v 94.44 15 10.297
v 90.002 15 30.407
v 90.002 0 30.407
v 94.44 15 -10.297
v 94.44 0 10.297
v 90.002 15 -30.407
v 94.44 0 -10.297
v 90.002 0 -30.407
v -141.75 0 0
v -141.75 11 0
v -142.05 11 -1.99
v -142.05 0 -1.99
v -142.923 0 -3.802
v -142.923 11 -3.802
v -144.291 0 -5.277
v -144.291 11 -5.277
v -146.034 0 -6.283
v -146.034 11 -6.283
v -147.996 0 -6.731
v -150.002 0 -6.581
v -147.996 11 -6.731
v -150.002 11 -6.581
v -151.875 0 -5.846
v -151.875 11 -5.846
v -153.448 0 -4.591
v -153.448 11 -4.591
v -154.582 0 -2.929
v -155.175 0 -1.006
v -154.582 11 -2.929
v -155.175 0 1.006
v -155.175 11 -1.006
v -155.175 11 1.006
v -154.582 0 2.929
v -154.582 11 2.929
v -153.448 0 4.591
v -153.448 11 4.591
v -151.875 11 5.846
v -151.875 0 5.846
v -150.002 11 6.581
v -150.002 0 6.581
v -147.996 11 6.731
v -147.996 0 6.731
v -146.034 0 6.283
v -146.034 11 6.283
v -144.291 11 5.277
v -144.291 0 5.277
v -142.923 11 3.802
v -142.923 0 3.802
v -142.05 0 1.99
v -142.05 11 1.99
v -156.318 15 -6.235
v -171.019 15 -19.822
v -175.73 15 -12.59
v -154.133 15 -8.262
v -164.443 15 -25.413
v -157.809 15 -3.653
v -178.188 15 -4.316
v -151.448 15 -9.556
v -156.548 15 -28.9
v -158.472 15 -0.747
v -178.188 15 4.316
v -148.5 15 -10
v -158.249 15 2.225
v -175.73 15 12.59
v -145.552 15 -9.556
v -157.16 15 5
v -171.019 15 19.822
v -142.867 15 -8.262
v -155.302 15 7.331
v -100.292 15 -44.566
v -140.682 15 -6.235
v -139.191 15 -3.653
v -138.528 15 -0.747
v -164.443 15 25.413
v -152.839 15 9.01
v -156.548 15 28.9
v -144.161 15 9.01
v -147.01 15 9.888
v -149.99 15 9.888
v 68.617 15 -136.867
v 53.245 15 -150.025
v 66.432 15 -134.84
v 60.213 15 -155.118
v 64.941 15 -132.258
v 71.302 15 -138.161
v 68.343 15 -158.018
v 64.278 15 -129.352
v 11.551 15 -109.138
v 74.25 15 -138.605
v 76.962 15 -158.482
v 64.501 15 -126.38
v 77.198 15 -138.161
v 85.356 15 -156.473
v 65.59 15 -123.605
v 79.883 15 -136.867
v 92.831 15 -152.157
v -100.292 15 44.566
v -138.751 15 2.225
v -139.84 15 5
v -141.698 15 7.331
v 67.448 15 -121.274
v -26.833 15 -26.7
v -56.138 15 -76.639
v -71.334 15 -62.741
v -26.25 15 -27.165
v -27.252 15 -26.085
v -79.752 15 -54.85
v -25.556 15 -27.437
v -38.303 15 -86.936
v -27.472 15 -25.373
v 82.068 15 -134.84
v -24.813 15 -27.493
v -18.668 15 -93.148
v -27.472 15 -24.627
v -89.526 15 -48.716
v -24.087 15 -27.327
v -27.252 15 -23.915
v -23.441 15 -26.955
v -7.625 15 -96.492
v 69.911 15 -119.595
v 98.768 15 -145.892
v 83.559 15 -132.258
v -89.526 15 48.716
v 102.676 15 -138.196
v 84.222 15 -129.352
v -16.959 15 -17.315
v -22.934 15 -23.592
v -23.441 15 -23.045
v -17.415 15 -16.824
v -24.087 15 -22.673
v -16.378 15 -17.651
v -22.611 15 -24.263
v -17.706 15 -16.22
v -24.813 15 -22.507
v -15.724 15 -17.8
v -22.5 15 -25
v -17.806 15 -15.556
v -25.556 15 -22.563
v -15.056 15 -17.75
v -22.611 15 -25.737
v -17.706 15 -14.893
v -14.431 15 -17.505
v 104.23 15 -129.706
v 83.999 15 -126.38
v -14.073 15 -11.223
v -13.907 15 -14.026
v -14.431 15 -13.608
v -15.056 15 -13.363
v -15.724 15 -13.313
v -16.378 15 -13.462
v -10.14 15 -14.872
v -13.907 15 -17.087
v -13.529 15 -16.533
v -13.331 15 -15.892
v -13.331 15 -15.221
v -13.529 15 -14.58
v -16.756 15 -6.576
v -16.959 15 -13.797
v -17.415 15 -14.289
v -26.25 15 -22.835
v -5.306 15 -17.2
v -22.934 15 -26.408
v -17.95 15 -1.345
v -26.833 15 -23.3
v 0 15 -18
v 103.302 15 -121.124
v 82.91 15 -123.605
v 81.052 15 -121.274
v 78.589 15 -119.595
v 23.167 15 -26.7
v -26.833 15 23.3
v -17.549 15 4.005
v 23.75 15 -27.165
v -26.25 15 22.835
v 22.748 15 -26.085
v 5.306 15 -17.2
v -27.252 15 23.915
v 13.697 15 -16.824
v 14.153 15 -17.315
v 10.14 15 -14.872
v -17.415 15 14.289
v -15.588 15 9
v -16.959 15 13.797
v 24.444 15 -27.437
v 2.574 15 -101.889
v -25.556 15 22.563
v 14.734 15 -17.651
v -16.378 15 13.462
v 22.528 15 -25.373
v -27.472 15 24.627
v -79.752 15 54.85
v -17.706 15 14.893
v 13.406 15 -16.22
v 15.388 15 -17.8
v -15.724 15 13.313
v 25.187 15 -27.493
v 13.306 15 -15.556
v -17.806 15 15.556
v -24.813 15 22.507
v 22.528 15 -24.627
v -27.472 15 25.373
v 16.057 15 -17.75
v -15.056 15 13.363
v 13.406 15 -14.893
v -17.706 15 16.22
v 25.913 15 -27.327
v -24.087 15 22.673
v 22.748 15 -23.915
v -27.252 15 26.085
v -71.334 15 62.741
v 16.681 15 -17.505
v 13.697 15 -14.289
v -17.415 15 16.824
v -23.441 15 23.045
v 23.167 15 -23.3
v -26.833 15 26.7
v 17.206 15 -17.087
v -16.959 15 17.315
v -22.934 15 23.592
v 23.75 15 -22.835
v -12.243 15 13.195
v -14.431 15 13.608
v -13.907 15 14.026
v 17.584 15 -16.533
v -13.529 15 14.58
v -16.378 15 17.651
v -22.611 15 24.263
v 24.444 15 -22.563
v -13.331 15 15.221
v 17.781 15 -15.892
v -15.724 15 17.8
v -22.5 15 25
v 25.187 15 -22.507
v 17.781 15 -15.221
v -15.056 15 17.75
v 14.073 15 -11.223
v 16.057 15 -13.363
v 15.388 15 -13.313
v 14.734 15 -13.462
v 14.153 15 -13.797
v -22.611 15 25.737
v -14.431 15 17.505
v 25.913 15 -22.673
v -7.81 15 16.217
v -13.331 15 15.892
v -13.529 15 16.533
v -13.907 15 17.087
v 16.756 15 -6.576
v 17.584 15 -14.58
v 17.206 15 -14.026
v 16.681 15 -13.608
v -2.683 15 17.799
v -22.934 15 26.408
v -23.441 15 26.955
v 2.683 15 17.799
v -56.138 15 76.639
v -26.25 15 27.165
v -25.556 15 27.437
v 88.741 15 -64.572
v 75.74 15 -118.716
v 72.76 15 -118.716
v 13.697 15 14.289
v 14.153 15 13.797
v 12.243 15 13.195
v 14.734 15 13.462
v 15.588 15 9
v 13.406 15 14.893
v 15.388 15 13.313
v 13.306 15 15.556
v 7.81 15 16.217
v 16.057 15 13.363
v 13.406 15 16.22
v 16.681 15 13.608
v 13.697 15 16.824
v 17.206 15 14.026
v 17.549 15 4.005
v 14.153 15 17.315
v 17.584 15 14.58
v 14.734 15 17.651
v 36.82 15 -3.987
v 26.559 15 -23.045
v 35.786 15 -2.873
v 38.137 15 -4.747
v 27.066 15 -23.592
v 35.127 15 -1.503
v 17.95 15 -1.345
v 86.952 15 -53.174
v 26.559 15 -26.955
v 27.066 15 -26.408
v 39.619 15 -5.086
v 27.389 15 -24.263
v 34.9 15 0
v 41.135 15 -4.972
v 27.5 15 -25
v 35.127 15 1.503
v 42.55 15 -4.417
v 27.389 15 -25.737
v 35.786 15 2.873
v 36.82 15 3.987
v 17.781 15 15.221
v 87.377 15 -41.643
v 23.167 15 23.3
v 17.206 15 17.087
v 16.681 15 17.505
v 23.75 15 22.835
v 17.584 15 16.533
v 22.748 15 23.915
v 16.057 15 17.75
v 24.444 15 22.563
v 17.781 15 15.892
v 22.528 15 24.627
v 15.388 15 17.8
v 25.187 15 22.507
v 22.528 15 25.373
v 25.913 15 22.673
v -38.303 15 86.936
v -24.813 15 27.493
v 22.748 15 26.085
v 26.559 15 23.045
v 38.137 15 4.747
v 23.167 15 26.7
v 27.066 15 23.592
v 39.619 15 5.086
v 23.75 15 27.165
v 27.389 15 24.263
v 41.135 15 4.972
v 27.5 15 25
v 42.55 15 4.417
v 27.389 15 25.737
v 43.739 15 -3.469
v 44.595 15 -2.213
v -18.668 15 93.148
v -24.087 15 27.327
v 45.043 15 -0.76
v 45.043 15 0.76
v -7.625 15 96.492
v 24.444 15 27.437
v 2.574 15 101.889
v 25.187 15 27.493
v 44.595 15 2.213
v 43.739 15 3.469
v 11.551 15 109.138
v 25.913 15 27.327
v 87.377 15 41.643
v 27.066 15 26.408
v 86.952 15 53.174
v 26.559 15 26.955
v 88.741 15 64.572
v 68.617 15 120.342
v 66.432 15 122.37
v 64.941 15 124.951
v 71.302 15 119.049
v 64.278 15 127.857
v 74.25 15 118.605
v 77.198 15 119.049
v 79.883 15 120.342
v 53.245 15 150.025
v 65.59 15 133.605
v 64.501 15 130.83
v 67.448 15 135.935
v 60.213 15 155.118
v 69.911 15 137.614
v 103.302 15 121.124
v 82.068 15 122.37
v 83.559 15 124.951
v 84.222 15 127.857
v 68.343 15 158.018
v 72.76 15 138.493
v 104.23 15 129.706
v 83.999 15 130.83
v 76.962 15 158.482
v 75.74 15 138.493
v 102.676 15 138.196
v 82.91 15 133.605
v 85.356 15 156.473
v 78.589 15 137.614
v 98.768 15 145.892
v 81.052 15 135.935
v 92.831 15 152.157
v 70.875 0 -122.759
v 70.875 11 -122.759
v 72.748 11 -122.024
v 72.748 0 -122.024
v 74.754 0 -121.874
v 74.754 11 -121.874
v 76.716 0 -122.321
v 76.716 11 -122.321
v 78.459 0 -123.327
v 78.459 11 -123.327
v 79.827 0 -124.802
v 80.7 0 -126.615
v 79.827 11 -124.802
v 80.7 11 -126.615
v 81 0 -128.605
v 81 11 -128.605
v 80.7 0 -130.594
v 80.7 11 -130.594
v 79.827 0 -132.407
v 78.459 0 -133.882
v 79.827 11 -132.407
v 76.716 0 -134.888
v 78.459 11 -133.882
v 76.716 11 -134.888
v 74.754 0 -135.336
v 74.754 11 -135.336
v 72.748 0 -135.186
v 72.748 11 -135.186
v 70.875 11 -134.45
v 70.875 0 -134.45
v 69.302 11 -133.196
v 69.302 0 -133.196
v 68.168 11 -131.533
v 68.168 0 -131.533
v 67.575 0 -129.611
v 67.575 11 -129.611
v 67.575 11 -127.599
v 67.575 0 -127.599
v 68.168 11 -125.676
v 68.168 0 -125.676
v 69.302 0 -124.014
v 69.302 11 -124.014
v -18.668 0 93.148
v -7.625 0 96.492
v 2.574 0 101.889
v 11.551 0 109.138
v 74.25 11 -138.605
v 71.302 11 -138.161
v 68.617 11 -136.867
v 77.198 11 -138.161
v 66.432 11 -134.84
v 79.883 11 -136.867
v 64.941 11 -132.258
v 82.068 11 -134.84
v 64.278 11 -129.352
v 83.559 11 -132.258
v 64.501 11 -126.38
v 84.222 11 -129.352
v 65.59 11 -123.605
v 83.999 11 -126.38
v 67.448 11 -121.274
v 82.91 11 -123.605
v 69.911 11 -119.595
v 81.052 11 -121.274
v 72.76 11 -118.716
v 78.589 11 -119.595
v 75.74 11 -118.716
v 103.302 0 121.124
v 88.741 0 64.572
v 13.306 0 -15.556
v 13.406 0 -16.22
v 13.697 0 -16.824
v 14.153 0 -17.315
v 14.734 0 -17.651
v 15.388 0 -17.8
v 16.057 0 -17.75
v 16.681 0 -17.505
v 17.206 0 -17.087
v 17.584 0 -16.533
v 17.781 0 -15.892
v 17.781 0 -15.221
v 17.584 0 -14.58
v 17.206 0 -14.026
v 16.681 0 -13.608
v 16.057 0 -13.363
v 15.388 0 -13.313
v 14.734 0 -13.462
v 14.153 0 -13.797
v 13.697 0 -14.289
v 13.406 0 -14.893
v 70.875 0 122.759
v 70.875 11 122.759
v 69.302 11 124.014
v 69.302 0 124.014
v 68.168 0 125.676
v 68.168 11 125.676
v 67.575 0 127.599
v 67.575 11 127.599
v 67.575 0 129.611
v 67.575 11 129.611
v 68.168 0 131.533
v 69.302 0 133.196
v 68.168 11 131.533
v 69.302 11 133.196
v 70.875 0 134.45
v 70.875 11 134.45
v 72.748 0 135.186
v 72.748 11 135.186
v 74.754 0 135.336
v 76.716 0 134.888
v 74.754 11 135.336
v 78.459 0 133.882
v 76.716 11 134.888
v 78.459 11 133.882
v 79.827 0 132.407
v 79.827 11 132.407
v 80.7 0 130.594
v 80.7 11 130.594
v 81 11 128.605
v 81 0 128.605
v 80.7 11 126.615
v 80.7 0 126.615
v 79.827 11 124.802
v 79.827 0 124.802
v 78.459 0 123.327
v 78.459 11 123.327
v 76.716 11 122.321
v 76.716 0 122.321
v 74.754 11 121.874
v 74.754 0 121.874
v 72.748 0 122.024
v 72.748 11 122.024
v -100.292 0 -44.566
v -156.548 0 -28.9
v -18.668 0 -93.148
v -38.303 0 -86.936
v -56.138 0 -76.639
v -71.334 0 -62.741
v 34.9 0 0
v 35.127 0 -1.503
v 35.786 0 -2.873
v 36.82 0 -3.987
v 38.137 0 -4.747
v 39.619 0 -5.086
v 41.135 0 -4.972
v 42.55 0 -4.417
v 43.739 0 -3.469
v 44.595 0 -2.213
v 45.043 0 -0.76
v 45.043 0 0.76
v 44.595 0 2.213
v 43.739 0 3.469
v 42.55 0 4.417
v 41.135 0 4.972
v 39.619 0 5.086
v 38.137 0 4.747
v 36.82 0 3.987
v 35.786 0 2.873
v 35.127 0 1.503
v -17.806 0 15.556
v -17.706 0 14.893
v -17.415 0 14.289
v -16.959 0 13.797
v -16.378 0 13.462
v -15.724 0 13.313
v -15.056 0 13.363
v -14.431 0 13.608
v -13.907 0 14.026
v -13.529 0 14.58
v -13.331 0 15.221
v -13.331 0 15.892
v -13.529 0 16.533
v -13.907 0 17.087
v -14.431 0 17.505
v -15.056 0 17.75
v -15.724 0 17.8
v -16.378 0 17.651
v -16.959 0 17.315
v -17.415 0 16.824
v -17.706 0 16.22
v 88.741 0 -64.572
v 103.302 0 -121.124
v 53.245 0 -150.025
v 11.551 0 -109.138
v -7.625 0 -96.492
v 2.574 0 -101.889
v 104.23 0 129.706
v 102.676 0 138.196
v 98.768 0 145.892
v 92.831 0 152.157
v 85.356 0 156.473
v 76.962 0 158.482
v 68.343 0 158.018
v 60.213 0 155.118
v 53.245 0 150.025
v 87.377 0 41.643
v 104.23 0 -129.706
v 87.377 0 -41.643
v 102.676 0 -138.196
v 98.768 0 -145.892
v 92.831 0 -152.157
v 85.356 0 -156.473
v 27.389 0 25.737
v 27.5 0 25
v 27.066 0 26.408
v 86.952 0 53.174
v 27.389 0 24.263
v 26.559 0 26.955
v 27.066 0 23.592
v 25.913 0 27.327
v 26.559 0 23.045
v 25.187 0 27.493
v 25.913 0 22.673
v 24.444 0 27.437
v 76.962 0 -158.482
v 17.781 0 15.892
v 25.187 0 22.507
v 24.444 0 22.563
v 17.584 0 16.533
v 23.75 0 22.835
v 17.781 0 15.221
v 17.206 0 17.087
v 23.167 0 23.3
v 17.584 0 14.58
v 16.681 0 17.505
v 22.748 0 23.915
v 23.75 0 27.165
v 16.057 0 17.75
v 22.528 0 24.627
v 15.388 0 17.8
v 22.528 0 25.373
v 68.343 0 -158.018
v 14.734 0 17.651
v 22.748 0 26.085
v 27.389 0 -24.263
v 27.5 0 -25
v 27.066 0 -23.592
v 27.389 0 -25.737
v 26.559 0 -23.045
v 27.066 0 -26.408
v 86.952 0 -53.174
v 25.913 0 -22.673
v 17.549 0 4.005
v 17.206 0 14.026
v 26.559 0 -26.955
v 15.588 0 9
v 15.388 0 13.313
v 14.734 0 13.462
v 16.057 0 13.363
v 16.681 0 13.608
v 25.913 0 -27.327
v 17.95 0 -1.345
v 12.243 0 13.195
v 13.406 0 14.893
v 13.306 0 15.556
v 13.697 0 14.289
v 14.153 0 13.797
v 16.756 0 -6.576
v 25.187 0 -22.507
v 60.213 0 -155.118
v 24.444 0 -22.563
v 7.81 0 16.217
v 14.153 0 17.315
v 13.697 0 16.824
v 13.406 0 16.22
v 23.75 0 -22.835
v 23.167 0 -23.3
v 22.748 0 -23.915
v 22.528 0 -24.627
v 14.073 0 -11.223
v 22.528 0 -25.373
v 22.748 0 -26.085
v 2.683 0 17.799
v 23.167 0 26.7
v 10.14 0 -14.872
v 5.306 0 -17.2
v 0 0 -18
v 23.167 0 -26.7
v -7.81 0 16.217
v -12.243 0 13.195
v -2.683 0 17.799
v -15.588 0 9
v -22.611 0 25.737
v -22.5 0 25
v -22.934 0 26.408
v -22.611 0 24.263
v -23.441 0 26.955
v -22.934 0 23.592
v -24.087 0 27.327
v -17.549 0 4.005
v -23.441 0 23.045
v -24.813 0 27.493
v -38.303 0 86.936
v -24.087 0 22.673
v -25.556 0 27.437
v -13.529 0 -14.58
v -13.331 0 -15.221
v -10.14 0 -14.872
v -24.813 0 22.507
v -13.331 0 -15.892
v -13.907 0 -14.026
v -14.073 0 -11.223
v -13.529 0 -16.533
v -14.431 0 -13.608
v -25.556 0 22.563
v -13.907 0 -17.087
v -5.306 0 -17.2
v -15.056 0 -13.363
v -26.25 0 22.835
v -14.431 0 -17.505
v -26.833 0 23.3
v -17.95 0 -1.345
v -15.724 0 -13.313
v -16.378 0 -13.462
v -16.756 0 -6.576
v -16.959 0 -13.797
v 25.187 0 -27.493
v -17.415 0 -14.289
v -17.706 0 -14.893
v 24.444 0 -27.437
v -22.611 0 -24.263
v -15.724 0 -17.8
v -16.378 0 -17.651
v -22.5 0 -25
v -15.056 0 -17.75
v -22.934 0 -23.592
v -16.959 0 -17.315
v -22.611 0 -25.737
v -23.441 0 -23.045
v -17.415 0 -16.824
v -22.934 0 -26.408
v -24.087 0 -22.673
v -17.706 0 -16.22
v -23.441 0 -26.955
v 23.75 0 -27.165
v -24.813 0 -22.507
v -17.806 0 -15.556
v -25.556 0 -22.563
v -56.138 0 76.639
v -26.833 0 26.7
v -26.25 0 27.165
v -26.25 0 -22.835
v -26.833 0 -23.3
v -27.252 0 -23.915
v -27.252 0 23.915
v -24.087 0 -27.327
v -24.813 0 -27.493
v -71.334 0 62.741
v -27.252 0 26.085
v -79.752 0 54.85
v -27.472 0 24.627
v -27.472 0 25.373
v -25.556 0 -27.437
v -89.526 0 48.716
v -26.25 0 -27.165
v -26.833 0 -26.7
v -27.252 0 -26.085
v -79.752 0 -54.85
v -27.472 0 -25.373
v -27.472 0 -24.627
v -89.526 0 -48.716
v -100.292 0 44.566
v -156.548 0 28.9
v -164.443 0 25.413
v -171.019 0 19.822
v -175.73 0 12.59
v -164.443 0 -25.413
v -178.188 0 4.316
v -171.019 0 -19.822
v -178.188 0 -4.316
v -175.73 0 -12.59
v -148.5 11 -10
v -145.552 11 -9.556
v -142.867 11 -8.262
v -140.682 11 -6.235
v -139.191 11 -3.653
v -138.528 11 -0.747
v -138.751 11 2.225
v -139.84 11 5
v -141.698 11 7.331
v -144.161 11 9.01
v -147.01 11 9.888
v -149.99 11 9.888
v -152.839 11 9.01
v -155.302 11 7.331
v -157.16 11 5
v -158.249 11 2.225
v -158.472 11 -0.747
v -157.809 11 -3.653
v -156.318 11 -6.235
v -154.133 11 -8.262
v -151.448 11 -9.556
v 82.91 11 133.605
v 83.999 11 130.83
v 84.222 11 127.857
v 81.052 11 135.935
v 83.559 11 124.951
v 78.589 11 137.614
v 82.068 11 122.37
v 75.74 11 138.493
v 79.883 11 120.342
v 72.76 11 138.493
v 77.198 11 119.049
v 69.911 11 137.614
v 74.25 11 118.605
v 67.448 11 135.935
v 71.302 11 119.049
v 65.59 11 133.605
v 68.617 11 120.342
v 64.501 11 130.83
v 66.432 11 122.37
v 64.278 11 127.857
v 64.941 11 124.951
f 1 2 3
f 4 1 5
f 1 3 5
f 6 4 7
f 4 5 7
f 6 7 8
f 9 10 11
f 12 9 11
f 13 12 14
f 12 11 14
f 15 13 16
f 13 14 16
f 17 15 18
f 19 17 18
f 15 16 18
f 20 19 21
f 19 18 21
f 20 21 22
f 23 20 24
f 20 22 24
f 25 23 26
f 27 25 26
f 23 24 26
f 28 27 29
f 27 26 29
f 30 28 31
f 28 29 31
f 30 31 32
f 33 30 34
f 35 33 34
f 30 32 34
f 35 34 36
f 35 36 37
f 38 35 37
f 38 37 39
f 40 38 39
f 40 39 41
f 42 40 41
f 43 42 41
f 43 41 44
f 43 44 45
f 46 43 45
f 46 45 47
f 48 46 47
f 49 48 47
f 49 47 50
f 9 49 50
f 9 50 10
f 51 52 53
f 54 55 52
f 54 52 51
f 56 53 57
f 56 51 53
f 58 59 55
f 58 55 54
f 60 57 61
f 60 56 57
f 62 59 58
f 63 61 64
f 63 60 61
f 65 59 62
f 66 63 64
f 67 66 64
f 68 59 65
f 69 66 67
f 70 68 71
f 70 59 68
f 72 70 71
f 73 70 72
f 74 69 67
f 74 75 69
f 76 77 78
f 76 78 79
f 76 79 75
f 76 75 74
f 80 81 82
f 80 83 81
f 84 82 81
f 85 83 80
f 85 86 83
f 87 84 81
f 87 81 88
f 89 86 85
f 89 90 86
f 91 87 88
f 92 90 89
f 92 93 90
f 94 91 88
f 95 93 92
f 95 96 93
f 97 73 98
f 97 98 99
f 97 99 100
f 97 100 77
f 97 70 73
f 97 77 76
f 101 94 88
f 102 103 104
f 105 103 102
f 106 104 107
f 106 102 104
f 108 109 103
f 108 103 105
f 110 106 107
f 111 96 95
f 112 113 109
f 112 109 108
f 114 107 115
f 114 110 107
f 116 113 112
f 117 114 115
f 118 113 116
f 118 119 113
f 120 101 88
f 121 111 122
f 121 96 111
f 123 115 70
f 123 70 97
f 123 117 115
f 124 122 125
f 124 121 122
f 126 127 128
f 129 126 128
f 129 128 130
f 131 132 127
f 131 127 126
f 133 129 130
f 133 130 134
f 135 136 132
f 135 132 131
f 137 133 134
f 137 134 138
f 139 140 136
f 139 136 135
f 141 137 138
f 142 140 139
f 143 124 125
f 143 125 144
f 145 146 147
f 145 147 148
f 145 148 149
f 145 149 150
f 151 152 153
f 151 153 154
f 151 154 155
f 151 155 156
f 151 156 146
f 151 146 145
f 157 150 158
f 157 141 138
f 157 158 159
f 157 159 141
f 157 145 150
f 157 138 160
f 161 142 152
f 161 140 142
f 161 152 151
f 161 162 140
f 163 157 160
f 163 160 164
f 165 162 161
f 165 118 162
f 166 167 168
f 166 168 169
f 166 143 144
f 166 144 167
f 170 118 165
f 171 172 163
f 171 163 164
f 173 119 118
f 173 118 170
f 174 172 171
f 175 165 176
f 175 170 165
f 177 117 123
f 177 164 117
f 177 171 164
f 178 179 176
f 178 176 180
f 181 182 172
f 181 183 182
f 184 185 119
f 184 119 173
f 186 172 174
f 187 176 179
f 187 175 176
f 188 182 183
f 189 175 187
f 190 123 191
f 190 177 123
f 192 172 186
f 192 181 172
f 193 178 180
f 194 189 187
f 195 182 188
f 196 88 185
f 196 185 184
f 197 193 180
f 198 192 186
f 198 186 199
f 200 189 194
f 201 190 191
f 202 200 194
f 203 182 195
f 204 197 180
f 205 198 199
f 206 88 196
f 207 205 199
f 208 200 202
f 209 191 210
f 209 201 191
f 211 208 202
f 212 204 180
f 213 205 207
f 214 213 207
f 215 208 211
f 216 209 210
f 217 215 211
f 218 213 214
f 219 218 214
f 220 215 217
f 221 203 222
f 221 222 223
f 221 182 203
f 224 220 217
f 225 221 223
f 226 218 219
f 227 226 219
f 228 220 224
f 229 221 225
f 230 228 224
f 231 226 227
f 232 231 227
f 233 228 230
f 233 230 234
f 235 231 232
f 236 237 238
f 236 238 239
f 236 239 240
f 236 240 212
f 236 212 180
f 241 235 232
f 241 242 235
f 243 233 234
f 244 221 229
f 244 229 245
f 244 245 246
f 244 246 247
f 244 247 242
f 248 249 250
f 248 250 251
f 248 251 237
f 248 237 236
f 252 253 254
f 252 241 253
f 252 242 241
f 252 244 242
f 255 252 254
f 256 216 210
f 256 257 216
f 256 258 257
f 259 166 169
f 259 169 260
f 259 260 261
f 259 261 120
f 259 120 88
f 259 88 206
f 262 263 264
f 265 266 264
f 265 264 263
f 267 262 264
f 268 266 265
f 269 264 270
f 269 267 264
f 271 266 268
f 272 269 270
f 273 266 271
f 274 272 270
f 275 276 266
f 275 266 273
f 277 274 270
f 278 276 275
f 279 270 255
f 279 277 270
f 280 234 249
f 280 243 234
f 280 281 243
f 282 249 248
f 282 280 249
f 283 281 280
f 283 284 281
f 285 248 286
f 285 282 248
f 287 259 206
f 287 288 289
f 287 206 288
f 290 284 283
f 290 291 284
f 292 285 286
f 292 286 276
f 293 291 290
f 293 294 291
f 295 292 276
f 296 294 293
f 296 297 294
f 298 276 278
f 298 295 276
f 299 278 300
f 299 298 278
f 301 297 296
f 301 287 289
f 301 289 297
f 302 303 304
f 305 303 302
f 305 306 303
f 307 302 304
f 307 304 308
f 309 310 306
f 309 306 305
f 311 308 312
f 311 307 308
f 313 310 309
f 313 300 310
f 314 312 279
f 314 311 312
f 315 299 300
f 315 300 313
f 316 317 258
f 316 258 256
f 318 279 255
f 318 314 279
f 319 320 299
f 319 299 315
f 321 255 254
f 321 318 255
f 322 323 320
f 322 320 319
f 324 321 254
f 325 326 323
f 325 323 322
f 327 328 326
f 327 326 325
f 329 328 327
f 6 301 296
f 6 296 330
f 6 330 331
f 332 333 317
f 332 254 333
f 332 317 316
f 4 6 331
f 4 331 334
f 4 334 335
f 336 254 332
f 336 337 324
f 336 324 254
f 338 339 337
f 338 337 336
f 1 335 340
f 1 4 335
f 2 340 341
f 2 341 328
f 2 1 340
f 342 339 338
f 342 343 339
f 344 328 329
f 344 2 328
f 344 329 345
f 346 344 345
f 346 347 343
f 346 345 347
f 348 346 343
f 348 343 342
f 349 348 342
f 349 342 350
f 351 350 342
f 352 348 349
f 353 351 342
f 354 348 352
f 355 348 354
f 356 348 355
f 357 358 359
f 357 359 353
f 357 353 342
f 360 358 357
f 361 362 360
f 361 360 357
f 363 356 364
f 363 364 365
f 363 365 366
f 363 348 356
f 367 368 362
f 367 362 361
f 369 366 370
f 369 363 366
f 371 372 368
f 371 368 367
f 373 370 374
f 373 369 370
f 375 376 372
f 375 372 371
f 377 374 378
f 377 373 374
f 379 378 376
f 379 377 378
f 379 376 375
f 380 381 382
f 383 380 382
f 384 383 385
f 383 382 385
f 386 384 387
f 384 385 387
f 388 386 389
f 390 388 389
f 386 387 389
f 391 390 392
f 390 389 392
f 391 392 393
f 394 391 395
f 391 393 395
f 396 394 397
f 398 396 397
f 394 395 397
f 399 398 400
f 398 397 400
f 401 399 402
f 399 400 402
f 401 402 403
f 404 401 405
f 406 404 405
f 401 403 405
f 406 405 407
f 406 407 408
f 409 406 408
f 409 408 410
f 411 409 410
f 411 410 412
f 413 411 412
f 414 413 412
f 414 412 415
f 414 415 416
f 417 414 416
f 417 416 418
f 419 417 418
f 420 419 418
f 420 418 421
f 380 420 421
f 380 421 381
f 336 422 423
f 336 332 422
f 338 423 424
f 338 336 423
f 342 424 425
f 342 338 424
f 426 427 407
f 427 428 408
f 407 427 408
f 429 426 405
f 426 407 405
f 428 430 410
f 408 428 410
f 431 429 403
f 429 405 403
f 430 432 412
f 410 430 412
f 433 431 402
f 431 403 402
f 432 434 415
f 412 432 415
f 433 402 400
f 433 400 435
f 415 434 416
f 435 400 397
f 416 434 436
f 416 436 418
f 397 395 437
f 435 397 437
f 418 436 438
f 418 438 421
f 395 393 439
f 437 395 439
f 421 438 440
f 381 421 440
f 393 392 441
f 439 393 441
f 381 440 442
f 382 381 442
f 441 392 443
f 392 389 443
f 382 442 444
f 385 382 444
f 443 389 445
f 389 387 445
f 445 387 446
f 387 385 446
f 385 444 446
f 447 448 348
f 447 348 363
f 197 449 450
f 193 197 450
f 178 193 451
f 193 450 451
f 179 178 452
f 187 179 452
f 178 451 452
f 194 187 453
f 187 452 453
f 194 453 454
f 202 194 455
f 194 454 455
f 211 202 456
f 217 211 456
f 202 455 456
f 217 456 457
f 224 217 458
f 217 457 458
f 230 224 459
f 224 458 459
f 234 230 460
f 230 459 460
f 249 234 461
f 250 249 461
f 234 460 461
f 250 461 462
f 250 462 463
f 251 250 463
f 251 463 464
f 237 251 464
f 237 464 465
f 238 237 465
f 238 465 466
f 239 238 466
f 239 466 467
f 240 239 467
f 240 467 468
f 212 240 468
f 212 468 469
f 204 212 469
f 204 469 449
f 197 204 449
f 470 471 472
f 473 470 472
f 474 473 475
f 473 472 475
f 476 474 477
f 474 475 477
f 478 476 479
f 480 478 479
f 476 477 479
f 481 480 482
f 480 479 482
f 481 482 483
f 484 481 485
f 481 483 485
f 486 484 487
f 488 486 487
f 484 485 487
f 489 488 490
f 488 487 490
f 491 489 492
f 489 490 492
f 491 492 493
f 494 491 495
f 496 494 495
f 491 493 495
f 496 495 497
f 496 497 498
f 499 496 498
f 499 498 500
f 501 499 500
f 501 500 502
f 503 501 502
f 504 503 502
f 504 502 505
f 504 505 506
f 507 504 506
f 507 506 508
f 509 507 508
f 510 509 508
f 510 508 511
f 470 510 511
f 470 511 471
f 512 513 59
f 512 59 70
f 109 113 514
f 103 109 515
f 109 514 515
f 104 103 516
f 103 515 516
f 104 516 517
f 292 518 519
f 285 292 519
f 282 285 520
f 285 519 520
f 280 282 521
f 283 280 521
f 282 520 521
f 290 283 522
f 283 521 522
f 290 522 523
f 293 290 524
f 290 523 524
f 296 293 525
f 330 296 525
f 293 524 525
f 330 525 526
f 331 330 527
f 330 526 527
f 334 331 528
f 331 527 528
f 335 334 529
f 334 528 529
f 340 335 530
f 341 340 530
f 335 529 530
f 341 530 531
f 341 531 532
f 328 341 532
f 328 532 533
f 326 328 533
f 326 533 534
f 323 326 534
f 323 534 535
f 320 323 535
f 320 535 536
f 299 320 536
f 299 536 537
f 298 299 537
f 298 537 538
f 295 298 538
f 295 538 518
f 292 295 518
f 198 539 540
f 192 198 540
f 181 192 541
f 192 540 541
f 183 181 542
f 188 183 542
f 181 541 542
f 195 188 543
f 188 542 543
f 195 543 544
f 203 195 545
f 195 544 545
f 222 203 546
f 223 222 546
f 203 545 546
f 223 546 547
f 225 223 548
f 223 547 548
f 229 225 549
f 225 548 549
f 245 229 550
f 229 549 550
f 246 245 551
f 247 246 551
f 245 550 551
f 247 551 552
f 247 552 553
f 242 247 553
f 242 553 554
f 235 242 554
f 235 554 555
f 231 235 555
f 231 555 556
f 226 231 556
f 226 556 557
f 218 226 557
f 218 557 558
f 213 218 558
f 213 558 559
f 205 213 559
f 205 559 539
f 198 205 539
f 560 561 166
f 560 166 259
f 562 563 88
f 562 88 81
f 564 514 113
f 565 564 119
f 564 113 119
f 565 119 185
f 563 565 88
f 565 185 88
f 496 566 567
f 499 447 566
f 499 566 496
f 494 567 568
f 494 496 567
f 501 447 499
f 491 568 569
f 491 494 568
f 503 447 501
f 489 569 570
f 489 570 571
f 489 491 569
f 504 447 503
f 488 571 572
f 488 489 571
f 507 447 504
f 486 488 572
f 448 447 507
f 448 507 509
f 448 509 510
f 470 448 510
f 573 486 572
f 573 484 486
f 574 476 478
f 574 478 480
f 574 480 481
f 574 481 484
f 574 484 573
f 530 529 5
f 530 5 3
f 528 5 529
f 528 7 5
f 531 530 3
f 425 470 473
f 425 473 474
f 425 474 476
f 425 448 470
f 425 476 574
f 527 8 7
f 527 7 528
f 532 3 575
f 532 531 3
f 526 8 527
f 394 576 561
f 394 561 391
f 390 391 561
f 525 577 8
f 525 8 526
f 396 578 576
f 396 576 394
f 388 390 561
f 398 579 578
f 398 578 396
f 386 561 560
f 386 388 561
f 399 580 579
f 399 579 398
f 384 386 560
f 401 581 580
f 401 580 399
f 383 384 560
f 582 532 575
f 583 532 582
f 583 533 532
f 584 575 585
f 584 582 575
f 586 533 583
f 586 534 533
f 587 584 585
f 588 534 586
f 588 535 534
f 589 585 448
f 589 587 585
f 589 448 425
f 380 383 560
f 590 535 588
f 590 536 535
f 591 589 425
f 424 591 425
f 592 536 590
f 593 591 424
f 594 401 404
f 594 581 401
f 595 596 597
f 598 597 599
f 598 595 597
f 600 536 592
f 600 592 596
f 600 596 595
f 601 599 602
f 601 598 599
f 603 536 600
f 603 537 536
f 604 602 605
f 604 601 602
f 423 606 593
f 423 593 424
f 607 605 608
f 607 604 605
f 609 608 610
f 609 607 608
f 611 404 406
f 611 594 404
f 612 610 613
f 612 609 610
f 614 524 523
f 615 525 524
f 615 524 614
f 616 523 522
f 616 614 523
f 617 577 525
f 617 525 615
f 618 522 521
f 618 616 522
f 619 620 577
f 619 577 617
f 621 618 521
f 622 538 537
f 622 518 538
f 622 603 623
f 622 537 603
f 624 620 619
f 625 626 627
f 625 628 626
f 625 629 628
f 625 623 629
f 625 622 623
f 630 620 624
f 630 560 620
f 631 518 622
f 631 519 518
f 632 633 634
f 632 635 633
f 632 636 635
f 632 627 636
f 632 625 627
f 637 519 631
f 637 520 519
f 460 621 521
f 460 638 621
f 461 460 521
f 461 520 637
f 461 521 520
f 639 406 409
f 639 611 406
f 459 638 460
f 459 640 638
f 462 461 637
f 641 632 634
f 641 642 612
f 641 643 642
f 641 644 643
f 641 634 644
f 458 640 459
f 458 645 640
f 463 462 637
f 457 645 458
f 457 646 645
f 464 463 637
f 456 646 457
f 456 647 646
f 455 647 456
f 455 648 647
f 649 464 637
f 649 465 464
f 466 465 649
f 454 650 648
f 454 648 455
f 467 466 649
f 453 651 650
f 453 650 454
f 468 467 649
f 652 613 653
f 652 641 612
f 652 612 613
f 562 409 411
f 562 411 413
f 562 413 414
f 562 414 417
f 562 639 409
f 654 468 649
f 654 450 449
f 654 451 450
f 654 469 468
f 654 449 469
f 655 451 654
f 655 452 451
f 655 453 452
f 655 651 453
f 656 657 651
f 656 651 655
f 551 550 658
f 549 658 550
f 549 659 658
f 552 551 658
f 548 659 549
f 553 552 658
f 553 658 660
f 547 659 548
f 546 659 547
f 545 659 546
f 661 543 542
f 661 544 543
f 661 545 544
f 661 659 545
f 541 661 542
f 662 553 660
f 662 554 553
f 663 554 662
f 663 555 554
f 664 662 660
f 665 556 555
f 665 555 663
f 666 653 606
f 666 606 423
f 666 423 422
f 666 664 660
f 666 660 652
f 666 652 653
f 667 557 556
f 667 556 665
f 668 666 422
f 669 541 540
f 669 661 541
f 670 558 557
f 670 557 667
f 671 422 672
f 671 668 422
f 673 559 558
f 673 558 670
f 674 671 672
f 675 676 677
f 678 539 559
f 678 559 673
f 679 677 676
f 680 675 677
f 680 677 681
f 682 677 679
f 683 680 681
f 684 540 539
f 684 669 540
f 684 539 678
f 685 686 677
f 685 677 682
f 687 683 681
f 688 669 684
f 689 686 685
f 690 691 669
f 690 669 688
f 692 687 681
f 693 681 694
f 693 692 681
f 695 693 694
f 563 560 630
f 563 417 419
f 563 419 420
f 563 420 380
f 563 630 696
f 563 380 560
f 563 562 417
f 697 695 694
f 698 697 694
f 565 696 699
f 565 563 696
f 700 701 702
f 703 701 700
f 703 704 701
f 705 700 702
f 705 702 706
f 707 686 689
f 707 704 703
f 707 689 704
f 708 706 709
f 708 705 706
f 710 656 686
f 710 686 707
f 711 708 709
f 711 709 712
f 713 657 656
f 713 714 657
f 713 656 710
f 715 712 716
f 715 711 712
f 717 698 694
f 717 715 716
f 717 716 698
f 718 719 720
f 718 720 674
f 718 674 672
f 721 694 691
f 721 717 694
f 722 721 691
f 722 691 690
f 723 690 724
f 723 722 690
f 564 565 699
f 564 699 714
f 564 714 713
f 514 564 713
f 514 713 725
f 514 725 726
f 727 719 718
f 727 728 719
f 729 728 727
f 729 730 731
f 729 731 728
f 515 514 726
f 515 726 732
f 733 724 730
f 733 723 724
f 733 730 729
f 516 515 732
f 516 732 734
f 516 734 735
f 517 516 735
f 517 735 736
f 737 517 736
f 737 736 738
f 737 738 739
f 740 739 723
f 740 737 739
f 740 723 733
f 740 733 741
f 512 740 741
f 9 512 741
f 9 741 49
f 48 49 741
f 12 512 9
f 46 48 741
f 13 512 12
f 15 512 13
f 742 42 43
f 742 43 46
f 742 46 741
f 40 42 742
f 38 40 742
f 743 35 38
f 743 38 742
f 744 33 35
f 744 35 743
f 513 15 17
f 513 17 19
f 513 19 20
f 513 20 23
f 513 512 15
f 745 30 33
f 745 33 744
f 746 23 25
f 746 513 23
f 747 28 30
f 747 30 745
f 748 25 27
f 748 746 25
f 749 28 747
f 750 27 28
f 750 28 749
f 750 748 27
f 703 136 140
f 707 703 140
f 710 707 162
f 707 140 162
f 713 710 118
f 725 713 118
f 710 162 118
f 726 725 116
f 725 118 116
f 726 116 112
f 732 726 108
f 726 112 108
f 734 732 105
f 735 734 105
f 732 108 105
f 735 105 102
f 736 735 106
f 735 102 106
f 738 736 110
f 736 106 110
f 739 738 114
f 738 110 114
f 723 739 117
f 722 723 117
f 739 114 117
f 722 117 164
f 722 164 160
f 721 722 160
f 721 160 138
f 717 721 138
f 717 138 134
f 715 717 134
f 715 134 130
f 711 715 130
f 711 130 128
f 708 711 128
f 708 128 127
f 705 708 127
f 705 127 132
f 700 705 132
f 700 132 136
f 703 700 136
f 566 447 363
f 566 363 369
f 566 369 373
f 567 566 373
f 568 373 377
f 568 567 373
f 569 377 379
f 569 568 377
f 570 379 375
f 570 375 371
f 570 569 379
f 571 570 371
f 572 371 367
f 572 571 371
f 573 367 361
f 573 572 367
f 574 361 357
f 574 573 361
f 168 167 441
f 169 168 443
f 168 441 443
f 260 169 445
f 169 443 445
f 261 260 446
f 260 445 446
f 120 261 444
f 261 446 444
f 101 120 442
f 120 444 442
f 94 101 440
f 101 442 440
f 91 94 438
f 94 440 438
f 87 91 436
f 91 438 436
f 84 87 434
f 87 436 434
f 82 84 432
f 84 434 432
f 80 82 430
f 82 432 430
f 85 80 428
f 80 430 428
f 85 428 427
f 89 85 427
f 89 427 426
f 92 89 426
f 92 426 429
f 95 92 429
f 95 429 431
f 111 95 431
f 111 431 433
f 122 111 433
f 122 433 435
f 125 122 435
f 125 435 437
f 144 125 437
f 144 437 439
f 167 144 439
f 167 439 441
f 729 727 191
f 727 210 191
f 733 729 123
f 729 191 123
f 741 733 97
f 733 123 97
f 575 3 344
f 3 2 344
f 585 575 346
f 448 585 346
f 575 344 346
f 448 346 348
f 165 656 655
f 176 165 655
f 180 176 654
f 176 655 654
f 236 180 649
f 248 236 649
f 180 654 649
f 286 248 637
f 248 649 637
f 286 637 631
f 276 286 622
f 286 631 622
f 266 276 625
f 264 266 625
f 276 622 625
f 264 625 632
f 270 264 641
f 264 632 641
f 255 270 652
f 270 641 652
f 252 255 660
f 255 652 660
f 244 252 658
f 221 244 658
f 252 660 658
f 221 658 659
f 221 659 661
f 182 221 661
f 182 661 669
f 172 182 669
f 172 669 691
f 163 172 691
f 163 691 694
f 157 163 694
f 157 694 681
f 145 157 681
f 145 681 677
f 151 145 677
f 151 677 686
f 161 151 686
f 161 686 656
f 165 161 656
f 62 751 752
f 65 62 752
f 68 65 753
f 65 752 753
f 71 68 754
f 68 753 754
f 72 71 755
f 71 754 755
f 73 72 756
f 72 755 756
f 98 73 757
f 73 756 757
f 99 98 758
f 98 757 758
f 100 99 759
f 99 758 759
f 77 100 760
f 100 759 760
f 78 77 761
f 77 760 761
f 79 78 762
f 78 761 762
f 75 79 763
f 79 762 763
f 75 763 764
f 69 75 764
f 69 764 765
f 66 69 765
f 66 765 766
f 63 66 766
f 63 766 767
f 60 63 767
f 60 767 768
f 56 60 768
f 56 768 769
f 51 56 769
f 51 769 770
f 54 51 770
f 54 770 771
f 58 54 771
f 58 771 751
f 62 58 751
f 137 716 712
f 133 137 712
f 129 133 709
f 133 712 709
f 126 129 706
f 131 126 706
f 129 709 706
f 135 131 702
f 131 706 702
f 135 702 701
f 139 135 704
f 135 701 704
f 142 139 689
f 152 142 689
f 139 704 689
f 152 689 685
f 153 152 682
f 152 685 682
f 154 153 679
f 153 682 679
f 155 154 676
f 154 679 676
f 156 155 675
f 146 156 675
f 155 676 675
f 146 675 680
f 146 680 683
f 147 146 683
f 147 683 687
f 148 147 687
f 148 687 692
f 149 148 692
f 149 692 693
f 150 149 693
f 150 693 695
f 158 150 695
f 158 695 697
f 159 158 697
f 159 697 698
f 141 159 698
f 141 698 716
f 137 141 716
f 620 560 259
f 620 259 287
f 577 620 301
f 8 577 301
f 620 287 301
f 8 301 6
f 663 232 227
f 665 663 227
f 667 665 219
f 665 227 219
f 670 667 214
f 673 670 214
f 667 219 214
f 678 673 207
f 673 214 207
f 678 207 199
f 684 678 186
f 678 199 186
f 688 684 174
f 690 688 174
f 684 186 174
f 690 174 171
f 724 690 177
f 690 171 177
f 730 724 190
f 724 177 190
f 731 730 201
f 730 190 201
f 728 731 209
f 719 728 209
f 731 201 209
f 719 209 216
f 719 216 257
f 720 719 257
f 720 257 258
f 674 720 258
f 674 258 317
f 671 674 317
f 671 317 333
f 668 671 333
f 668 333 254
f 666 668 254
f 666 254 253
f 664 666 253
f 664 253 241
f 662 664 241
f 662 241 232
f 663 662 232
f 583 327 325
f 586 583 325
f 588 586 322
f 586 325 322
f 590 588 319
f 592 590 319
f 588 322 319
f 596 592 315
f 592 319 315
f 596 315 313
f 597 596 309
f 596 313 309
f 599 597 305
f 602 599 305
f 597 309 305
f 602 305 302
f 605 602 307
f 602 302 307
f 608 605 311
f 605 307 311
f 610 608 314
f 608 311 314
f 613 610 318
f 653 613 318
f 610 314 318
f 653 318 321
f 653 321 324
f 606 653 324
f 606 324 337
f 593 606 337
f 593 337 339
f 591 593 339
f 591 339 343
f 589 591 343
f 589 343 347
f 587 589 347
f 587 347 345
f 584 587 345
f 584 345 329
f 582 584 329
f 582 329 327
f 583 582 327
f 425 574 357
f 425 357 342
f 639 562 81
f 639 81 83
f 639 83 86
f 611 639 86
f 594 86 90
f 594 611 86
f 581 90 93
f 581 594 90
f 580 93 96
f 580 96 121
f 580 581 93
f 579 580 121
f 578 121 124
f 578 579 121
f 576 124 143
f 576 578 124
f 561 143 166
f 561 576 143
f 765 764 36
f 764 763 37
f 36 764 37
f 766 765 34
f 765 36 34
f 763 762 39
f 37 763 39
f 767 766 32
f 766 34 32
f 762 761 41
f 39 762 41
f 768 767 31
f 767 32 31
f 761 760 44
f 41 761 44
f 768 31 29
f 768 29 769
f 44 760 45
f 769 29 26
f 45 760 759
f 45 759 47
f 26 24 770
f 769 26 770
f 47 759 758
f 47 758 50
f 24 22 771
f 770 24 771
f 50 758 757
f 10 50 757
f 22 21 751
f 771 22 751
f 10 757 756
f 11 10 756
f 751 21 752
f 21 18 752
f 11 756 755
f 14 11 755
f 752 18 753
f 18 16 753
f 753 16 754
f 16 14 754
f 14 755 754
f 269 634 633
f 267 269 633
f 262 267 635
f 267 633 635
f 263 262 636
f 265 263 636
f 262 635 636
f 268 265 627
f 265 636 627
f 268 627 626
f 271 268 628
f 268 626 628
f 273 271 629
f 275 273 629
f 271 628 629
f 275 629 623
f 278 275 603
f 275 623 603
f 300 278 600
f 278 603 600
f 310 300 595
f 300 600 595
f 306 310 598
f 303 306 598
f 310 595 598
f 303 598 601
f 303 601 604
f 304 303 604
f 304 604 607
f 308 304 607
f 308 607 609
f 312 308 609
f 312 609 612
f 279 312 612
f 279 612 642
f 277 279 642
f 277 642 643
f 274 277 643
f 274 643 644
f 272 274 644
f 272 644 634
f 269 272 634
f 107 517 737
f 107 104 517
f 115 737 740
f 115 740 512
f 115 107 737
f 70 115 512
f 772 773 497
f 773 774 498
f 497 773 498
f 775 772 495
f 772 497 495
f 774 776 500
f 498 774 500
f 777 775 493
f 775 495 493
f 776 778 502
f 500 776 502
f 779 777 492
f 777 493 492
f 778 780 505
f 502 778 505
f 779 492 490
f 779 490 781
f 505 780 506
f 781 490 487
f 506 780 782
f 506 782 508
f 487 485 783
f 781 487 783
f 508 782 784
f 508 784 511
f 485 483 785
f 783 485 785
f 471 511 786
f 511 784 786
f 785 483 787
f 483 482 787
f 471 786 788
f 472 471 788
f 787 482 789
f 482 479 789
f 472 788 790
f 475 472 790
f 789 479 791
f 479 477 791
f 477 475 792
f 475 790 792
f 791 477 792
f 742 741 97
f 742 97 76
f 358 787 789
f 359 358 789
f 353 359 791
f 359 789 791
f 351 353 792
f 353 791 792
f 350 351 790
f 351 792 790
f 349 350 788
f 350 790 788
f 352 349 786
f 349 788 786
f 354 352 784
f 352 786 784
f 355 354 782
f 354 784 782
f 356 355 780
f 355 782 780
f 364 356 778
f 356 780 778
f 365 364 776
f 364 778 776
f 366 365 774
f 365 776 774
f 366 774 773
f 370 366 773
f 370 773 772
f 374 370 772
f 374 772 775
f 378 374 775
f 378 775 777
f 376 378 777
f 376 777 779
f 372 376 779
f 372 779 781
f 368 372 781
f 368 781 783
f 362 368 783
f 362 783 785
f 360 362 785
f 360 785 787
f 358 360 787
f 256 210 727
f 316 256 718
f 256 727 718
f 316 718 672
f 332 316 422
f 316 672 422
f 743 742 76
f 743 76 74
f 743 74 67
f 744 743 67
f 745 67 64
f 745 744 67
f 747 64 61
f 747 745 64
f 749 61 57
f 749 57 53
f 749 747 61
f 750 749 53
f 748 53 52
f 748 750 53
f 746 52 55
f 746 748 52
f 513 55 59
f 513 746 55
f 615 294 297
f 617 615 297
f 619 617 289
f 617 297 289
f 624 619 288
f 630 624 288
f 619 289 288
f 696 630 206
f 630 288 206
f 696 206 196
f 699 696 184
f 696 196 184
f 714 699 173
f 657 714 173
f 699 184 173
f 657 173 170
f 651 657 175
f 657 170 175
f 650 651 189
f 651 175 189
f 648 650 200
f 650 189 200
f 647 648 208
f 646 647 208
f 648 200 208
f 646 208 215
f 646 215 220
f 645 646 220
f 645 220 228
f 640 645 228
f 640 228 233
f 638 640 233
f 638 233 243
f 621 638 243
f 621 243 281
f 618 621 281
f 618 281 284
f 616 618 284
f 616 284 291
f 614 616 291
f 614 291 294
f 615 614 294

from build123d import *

# Parameters (mm, degrees)
SKETCH1_R                = 95
BOSS_EXTRUDE1_DEPTH      = 15
SKETCH2_R                = 10
BOSS_EXTRUDE2_DEPTH      = 15
FILLET1_R                = 60
SKETCH4_R                = 10
BOSS_EXTRUDE3_DEPTH      = 11
M12_CLEARANCE_HOLE1_D    = 13.5
CIRPATTERN1_COUNT        = 3
FILLET1_OF_CIRPATTERN1_R = 60
SKETCH7_R                = 18
CUT_EXTRUDE1_DEPTH       = 240.25451688
M4_CLEARANCE_HOLE1_D     = 4.5
M6_TAPPED_HOLE1_D        = 5
M12_TAPPED_HOLE1_D       = 10.2


with BuildPart() as part:
    # Sketch1 → Boss-Extrude1 (new body)
    with BuildSketch(Plane(origin=(0, 0, 0), x_dir=(1, 0, 0), z_dir=(0, 1, 0))):
        with Locations(Location((0, 0, 0), (0, 0, 270))):
            Circle(SKETCH1_R)
    extrude(amount=BOSS_EXTRUDE1_DEPTH)

    # Sketch2 → Boss-Extrude2 (add)
    with BuildSketch(Plane.XZ):
        with BuildLine():
            Line((-156.547830163, -28.900388054), (-80.777472107, -50))
            ThreePointArc((-80.777472107, -50), (-95, 0), (-80.777472107, 50))
            Line((-80.777472107, 50), (-156.547830163, 28.900388054))
            ThreePointArc((-156.547830163, 28.900388054), (-178.5, 0), (-156.547830163, -28.900388054))
        make_face()
        with Locations(Location((-148.5, 0, 0), (0, 0, 270))):
            Circle(SKETCH2_R, mode=Mode.SUBTRACT)
    boss_extrude2 = extrude(amount=-BOSS_EXTRUDE2_DEPTH)

    # Fillet1
    fillet1_edges = [part.edges().sort_by_distance(p)[0] for p in [
        (-80.777472107, 7.5, 50),
        (-80.777472107, 7.5, -50),
    ]]
    fillet(fillet1_edges, radius=FILLET1_R)

    # Sketch4 → Boss-Extrude3 (add)
    with BuildSketch(Plane.XZ):
        with Locations(Location((-148.5, 0, 0), (0, 0, 271.879376726))):
            Circle(SKETCH4_R)
    boss_extrude3 = extrude(amount=-BOSS_EXTRUDE3_DEPTH)

    # M12 Clearance Hole1 (through all)
    with Locations(Plane(origin=(0, 0, 0), x_dir=(-1, 0, 0), z_dir=(0, -1, 0))):
        with Locations((148.5, 0)):
            m12_clearance_hole1 = Hole(M12_CLEARANCE_HOLE1_D / 2)

    # CirPattern1: Boss-Extrude2, Boss-Extrude3, M12 Clearance Hole1 ×3 about axis
    cirpattern1_axis = Axis((0, 0, 0), (0, 1, 0))
    add([boss_extrude2.rotate(cirpattern1_axis, i * 360 / CIRPATTERN1_COUNT) for i in range(1, CIRPATTERN1_COUNT)])
    add([boss_extrude3.rotate(cirpattern1_axis, i * 360 / CIRPATTERN1_COUNT) for i in range(1, CIRPATTERN1_COUNT)])
    add([m12_clearance_hole1.rotate(cirpattern1_axis, i * 360 / CIRPATTERN1_COUNT) for i in range(1, CIRPATTERN1_COUNT)], mode=Mode.SUBTRACT)

    # Fillet1 of CirPattern1
    fillet1_of_cirpattern1_edges = [part.edges().sort_by_distance(p)[0] for p in [
        (83.690006243, 7.5, 44.955342898),
        (-2.912534136, 7.5, 94.955342898),
        (-2.912534136, 7.5, -94.955342898),
        (83.690006243, 7.5, -44.955342898),
    ]]
    fillet(fillet1_of_cirpattern1_edges, radius=FILLET1_OF_CIRPATTERN1_R)

    # Sketch7 → Cut-Extrude1 (cut, through all)
    with BuildSketch(Plane(origin=(0, 0, 0), x_dir=(-1, 0, 0), z_dir=(0, -1, 0))):
        with Locations(Location((0, 0, 0), (0, 0, 90))):
            Circle(SKETCH7_R)
    extrude(amount=-CUT_EXTRUDE1_DEPTH, mode=Mode.SUBTRACT)

    # M4 Clearance Hole1 (through all)
    with Locations(Plane(origin=(0, 15, 0), x_dir=(1, 0, 0), z_dir=(0, 1, 0))):
        with Locations((-15.556349186, -15.556349186), (15.556349186, -15.556349186), (15.556349186, 15.556349186), (-15.556349186, 15.556349186)):
            Hole(M4_CLEARANCE_HOLE1_D / 2)

    # M6 Tapped Hole1 (through all)
    with Locations(Plane(origin=(0, 0, 0), x_dir=(-1, 0, 0), z_dir=(0, -1, 0))):
        with Locations((0, 0), (25, 25), (-25, -25), (-25, 25), (25, -25)):
            Hole(M6_TAPPED_HOLE1_D / 2)

    # M12 Tapped Hole1 (through all)
    with Locations(Plane(origin=(0, 15, 0), x_dir=(1, 0, 0), z_dir=(0, 1, 0))):
        with Locations((40, 0)):
            Hole(M12_TAPPED_HOLE1_D / 2)


solid = part.part
